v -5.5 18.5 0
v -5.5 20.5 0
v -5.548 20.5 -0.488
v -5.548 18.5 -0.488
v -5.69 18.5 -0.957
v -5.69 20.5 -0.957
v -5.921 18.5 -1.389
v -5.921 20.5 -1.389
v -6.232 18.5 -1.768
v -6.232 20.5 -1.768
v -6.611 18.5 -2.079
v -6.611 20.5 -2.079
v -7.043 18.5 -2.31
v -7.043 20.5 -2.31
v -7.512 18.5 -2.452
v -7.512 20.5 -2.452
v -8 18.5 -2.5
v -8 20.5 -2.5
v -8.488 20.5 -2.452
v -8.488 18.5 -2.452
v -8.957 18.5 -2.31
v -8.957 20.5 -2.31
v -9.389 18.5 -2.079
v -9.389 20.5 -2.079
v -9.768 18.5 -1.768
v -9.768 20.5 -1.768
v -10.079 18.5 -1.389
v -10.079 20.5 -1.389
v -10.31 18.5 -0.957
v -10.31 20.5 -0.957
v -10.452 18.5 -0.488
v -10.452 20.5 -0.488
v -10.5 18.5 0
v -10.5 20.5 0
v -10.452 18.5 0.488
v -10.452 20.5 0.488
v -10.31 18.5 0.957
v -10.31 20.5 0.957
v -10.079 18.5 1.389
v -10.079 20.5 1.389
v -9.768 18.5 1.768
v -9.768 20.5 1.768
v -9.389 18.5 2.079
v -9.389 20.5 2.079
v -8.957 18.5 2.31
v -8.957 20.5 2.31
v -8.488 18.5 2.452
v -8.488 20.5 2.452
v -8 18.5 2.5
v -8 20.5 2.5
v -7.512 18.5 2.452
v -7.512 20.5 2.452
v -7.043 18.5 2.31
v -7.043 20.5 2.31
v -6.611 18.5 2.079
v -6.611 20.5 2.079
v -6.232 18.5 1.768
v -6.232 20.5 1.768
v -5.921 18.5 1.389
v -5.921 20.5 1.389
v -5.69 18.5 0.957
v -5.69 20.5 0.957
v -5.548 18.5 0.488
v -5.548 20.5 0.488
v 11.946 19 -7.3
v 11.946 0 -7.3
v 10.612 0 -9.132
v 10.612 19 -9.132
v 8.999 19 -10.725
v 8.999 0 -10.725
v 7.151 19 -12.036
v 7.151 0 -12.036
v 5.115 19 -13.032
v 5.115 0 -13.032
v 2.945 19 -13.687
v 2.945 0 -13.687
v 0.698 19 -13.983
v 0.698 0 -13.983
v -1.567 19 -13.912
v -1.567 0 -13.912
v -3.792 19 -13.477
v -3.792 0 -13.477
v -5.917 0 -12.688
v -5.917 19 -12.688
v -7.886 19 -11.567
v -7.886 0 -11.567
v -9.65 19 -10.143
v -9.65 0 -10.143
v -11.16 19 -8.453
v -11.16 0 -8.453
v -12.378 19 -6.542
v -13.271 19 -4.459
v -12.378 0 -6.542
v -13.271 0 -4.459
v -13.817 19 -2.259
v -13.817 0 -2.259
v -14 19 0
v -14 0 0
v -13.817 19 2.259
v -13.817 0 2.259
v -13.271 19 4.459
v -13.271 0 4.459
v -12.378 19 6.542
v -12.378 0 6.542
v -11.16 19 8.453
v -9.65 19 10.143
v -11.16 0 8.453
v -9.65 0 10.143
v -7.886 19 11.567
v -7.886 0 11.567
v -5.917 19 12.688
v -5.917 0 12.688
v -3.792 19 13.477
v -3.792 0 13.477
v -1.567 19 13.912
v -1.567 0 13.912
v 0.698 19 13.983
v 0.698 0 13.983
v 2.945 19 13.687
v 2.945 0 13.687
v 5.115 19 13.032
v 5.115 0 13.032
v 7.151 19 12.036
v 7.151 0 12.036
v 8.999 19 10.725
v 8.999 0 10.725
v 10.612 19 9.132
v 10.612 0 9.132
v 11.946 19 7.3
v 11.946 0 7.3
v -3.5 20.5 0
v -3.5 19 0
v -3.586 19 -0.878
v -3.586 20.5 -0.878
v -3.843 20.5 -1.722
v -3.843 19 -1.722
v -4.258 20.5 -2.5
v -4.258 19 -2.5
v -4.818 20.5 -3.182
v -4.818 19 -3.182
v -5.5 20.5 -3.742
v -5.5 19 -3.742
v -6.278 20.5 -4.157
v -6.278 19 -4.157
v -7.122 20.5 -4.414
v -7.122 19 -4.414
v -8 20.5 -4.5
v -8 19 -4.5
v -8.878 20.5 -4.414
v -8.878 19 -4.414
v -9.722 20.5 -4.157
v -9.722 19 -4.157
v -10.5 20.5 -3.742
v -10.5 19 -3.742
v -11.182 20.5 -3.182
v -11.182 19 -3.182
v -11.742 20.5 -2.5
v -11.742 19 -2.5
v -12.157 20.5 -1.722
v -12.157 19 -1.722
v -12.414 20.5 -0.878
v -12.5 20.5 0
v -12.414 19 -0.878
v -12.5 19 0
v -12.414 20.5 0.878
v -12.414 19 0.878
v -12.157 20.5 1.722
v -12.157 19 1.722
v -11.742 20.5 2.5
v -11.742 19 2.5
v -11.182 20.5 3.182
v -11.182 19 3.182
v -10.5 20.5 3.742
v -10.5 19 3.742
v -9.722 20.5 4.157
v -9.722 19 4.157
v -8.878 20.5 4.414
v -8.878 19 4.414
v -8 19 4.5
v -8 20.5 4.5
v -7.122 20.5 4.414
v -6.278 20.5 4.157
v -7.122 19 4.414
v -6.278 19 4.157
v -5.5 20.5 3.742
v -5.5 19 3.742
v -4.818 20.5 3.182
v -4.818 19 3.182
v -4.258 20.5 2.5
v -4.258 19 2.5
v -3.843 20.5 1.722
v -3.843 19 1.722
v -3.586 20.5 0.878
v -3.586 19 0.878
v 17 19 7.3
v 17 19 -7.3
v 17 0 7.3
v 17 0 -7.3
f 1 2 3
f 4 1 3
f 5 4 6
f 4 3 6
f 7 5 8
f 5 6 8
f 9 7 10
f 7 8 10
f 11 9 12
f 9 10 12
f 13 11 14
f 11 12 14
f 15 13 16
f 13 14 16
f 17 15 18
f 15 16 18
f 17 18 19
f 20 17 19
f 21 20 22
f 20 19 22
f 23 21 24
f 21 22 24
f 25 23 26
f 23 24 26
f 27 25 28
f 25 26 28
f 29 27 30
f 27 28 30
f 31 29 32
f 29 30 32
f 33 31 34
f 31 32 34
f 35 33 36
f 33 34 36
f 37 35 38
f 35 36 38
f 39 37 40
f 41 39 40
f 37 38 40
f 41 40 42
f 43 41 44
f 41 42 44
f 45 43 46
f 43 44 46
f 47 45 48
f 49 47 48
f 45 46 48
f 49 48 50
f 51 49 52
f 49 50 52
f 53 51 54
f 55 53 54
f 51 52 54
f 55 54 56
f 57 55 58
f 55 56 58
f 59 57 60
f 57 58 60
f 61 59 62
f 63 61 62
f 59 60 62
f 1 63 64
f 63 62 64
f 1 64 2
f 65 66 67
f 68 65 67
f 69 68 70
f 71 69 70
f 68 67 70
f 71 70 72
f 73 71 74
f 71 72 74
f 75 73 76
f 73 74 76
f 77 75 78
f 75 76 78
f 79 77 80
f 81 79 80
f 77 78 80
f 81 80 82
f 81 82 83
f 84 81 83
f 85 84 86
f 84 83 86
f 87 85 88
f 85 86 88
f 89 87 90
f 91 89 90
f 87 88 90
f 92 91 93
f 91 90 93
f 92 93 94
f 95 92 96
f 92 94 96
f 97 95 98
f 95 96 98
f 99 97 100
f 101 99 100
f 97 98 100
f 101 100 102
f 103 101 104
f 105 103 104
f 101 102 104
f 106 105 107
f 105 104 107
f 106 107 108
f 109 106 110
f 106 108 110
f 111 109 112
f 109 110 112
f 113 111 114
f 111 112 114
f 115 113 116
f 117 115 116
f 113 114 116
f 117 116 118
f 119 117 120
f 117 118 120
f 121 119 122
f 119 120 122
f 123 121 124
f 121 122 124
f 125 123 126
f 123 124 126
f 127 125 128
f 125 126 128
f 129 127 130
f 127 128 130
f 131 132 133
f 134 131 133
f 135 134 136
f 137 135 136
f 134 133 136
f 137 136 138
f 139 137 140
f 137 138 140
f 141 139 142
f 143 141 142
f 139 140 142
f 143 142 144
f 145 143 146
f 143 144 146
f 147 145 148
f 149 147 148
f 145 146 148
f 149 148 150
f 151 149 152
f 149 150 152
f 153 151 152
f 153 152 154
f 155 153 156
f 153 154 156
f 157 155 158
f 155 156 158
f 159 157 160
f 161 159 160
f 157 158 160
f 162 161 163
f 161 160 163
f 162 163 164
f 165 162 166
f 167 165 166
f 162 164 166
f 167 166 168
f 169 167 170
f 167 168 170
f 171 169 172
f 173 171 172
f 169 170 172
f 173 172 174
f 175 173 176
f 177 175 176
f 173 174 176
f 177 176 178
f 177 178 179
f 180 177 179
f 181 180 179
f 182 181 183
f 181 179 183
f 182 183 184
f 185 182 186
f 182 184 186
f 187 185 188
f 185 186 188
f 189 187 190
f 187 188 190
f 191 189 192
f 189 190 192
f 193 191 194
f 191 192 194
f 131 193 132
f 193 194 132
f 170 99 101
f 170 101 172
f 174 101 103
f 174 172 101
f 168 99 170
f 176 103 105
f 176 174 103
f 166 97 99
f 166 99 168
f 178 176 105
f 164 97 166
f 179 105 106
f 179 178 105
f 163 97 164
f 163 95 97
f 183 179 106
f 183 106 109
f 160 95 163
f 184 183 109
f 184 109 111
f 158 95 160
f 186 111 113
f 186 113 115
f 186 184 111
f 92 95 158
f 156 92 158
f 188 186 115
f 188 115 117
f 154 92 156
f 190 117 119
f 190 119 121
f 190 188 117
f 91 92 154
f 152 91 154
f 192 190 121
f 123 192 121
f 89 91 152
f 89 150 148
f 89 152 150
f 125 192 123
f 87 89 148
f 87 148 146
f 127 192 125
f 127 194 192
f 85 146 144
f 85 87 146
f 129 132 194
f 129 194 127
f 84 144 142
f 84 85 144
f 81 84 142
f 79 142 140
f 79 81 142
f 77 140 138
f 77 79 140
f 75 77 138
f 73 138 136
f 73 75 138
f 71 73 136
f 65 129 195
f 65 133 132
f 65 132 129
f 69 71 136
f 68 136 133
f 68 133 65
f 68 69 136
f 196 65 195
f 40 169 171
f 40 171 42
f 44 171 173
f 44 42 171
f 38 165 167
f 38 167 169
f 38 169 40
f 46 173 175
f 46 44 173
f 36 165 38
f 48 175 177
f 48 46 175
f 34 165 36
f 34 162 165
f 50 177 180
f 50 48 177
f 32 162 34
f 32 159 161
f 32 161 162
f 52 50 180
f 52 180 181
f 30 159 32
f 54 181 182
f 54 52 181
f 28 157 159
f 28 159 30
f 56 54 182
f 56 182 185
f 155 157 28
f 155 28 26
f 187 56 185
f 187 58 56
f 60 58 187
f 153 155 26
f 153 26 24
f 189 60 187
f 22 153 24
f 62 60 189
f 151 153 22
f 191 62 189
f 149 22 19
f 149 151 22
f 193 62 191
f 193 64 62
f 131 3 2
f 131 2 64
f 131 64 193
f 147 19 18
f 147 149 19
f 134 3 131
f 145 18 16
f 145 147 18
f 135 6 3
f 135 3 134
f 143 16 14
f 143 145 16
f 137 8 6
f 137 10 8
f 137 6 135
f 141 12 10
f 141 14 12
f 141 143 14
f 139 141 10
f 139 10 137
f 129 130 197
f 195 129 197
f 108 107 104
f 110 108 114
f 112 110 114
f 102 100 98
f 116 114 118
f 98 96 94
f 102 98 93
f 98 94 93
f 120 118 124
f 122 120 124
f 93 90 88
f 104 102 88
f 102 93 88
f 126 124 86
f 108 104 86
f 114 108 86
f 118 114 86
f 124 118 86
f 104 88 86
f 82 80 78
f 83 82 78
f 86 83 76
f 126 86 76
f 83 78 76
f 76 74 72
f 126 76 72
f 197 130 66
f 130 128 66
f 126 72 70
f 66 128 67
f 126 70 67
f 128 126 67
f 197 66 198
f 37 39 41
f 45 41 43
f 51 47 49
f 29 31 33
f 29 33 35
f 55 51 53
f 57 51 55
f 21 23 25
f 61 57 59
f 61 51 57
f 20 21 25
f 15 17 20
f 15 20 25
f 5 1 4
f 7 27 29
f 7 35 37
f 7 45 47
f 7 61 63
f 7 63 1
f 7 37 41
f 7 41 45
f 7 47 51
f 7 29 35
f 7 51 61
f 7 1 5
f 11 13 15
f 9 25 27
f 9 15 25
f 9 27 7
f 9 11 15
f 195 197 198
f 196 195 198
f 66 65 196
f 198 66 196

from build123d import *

# Parameters (mm, degrees)
CROQUIS1_R                 = 14
CROQUIS1_W                 = 14.155779923
CROQUIS1_H                 = 14.6
SALIENTE_EXTRUIR1_DEPTH    = 19
CROQUIS2_R                 = 4.5
SALIENTE_EXTRUIR2_DEPTH    = 1.5
CROQUIS3_R                 = 2.5
SALIENTE_EXTRUIR3_DEPTH    = 2.5
SALIENTE_EXTRUIR4_DEPTH    = 6
CROQUIS5_R                 = 2.5
CORTAR_EXTRUIR1_DEPTH      = 10
CORTAR_EXTRUIR1_DEPTH_BACK = 2


with BuildPart() as part:
    # Croquis1 → Saliente-Extruir1 (new body)
    with BuildSketch(Plane(origin=(0, 0, 0), x_dir=(1, 0, 0), z_dir=(0, 1, 0))):
        Circle(CROQUIS1_R)
        with Locations((9.922110038, 0)):
            Rectangle(CROQUIS1_W, CROQUIS1_H)
    extrude(amount=SALIENTE_EXTRUIR1_DEPTH)

    # Croquis2 → Saliente-Extruir2 (add)
    with BuildSketch(Plane(origin=(0, 19, 0), x_dir=(1, 0, 0), z_dir=(0, 1, 0))):
        with Locations((-8, 0)):
            Circle(CROQUIS2_R)
    extrude(amount=SALIENTE_EXTRUIR2_DEPTH)

    # Croquis3 → Saliente-Extruir3 (add)
    with BuildSketch(Plane(origin=(0, 20.5, 0), x_dir=(1, 0, 0), z_dir=(0, 1, 0))):
        with Locations((-8, 0)):
            Circle(CROQUIS3_R)
    extrude(amount=SALIENTE_EXTRUIR3_DEPTH)

    # Croquis4 → Saliente-Extruir4 (add)
    with BuildSketch(Plane(origin=(0, 23, 0), x_dir=(1, 0, 0), z_dir=(0, 1, 0))):
        with BuildLine():
            Line((-9.5, 2), (-9.5, -2))
            ThreePointArc((-9.5, -2), (-8, -2.5), (-6.5, -2))
            Line((-6.5, -2), (-6.5, 2))
            ThreePointArc((-6.5, 2), (-8, 2.5), (-9.5, 2))
        make_face()
    extrude(amount=SALIENTE_EXTRUIR4_DEPTH)

    # Croquis5 → Cortar-Extruir1 (cut, two sides)
    with BuildSketch(Plane(origin=(0, 20.5, 0), x_dir=(1, 0, 0), z_dir=(0, 1, 0))) as cortar_extruir1_sk:
        with Locations((-8, 0)):
            Circle(CROQUIS5_R)
    extrude(amount=CORTAR_EXTRUIR1_DEPTH, mode=Mode.SUBTRACT)
    extrude(cortar_extruir1_sk.sketch, amount=-CORTAR_EXTRUIR1_DEPTH_BACK, mode=Mode.SUBTRACT)


solid = part.part
